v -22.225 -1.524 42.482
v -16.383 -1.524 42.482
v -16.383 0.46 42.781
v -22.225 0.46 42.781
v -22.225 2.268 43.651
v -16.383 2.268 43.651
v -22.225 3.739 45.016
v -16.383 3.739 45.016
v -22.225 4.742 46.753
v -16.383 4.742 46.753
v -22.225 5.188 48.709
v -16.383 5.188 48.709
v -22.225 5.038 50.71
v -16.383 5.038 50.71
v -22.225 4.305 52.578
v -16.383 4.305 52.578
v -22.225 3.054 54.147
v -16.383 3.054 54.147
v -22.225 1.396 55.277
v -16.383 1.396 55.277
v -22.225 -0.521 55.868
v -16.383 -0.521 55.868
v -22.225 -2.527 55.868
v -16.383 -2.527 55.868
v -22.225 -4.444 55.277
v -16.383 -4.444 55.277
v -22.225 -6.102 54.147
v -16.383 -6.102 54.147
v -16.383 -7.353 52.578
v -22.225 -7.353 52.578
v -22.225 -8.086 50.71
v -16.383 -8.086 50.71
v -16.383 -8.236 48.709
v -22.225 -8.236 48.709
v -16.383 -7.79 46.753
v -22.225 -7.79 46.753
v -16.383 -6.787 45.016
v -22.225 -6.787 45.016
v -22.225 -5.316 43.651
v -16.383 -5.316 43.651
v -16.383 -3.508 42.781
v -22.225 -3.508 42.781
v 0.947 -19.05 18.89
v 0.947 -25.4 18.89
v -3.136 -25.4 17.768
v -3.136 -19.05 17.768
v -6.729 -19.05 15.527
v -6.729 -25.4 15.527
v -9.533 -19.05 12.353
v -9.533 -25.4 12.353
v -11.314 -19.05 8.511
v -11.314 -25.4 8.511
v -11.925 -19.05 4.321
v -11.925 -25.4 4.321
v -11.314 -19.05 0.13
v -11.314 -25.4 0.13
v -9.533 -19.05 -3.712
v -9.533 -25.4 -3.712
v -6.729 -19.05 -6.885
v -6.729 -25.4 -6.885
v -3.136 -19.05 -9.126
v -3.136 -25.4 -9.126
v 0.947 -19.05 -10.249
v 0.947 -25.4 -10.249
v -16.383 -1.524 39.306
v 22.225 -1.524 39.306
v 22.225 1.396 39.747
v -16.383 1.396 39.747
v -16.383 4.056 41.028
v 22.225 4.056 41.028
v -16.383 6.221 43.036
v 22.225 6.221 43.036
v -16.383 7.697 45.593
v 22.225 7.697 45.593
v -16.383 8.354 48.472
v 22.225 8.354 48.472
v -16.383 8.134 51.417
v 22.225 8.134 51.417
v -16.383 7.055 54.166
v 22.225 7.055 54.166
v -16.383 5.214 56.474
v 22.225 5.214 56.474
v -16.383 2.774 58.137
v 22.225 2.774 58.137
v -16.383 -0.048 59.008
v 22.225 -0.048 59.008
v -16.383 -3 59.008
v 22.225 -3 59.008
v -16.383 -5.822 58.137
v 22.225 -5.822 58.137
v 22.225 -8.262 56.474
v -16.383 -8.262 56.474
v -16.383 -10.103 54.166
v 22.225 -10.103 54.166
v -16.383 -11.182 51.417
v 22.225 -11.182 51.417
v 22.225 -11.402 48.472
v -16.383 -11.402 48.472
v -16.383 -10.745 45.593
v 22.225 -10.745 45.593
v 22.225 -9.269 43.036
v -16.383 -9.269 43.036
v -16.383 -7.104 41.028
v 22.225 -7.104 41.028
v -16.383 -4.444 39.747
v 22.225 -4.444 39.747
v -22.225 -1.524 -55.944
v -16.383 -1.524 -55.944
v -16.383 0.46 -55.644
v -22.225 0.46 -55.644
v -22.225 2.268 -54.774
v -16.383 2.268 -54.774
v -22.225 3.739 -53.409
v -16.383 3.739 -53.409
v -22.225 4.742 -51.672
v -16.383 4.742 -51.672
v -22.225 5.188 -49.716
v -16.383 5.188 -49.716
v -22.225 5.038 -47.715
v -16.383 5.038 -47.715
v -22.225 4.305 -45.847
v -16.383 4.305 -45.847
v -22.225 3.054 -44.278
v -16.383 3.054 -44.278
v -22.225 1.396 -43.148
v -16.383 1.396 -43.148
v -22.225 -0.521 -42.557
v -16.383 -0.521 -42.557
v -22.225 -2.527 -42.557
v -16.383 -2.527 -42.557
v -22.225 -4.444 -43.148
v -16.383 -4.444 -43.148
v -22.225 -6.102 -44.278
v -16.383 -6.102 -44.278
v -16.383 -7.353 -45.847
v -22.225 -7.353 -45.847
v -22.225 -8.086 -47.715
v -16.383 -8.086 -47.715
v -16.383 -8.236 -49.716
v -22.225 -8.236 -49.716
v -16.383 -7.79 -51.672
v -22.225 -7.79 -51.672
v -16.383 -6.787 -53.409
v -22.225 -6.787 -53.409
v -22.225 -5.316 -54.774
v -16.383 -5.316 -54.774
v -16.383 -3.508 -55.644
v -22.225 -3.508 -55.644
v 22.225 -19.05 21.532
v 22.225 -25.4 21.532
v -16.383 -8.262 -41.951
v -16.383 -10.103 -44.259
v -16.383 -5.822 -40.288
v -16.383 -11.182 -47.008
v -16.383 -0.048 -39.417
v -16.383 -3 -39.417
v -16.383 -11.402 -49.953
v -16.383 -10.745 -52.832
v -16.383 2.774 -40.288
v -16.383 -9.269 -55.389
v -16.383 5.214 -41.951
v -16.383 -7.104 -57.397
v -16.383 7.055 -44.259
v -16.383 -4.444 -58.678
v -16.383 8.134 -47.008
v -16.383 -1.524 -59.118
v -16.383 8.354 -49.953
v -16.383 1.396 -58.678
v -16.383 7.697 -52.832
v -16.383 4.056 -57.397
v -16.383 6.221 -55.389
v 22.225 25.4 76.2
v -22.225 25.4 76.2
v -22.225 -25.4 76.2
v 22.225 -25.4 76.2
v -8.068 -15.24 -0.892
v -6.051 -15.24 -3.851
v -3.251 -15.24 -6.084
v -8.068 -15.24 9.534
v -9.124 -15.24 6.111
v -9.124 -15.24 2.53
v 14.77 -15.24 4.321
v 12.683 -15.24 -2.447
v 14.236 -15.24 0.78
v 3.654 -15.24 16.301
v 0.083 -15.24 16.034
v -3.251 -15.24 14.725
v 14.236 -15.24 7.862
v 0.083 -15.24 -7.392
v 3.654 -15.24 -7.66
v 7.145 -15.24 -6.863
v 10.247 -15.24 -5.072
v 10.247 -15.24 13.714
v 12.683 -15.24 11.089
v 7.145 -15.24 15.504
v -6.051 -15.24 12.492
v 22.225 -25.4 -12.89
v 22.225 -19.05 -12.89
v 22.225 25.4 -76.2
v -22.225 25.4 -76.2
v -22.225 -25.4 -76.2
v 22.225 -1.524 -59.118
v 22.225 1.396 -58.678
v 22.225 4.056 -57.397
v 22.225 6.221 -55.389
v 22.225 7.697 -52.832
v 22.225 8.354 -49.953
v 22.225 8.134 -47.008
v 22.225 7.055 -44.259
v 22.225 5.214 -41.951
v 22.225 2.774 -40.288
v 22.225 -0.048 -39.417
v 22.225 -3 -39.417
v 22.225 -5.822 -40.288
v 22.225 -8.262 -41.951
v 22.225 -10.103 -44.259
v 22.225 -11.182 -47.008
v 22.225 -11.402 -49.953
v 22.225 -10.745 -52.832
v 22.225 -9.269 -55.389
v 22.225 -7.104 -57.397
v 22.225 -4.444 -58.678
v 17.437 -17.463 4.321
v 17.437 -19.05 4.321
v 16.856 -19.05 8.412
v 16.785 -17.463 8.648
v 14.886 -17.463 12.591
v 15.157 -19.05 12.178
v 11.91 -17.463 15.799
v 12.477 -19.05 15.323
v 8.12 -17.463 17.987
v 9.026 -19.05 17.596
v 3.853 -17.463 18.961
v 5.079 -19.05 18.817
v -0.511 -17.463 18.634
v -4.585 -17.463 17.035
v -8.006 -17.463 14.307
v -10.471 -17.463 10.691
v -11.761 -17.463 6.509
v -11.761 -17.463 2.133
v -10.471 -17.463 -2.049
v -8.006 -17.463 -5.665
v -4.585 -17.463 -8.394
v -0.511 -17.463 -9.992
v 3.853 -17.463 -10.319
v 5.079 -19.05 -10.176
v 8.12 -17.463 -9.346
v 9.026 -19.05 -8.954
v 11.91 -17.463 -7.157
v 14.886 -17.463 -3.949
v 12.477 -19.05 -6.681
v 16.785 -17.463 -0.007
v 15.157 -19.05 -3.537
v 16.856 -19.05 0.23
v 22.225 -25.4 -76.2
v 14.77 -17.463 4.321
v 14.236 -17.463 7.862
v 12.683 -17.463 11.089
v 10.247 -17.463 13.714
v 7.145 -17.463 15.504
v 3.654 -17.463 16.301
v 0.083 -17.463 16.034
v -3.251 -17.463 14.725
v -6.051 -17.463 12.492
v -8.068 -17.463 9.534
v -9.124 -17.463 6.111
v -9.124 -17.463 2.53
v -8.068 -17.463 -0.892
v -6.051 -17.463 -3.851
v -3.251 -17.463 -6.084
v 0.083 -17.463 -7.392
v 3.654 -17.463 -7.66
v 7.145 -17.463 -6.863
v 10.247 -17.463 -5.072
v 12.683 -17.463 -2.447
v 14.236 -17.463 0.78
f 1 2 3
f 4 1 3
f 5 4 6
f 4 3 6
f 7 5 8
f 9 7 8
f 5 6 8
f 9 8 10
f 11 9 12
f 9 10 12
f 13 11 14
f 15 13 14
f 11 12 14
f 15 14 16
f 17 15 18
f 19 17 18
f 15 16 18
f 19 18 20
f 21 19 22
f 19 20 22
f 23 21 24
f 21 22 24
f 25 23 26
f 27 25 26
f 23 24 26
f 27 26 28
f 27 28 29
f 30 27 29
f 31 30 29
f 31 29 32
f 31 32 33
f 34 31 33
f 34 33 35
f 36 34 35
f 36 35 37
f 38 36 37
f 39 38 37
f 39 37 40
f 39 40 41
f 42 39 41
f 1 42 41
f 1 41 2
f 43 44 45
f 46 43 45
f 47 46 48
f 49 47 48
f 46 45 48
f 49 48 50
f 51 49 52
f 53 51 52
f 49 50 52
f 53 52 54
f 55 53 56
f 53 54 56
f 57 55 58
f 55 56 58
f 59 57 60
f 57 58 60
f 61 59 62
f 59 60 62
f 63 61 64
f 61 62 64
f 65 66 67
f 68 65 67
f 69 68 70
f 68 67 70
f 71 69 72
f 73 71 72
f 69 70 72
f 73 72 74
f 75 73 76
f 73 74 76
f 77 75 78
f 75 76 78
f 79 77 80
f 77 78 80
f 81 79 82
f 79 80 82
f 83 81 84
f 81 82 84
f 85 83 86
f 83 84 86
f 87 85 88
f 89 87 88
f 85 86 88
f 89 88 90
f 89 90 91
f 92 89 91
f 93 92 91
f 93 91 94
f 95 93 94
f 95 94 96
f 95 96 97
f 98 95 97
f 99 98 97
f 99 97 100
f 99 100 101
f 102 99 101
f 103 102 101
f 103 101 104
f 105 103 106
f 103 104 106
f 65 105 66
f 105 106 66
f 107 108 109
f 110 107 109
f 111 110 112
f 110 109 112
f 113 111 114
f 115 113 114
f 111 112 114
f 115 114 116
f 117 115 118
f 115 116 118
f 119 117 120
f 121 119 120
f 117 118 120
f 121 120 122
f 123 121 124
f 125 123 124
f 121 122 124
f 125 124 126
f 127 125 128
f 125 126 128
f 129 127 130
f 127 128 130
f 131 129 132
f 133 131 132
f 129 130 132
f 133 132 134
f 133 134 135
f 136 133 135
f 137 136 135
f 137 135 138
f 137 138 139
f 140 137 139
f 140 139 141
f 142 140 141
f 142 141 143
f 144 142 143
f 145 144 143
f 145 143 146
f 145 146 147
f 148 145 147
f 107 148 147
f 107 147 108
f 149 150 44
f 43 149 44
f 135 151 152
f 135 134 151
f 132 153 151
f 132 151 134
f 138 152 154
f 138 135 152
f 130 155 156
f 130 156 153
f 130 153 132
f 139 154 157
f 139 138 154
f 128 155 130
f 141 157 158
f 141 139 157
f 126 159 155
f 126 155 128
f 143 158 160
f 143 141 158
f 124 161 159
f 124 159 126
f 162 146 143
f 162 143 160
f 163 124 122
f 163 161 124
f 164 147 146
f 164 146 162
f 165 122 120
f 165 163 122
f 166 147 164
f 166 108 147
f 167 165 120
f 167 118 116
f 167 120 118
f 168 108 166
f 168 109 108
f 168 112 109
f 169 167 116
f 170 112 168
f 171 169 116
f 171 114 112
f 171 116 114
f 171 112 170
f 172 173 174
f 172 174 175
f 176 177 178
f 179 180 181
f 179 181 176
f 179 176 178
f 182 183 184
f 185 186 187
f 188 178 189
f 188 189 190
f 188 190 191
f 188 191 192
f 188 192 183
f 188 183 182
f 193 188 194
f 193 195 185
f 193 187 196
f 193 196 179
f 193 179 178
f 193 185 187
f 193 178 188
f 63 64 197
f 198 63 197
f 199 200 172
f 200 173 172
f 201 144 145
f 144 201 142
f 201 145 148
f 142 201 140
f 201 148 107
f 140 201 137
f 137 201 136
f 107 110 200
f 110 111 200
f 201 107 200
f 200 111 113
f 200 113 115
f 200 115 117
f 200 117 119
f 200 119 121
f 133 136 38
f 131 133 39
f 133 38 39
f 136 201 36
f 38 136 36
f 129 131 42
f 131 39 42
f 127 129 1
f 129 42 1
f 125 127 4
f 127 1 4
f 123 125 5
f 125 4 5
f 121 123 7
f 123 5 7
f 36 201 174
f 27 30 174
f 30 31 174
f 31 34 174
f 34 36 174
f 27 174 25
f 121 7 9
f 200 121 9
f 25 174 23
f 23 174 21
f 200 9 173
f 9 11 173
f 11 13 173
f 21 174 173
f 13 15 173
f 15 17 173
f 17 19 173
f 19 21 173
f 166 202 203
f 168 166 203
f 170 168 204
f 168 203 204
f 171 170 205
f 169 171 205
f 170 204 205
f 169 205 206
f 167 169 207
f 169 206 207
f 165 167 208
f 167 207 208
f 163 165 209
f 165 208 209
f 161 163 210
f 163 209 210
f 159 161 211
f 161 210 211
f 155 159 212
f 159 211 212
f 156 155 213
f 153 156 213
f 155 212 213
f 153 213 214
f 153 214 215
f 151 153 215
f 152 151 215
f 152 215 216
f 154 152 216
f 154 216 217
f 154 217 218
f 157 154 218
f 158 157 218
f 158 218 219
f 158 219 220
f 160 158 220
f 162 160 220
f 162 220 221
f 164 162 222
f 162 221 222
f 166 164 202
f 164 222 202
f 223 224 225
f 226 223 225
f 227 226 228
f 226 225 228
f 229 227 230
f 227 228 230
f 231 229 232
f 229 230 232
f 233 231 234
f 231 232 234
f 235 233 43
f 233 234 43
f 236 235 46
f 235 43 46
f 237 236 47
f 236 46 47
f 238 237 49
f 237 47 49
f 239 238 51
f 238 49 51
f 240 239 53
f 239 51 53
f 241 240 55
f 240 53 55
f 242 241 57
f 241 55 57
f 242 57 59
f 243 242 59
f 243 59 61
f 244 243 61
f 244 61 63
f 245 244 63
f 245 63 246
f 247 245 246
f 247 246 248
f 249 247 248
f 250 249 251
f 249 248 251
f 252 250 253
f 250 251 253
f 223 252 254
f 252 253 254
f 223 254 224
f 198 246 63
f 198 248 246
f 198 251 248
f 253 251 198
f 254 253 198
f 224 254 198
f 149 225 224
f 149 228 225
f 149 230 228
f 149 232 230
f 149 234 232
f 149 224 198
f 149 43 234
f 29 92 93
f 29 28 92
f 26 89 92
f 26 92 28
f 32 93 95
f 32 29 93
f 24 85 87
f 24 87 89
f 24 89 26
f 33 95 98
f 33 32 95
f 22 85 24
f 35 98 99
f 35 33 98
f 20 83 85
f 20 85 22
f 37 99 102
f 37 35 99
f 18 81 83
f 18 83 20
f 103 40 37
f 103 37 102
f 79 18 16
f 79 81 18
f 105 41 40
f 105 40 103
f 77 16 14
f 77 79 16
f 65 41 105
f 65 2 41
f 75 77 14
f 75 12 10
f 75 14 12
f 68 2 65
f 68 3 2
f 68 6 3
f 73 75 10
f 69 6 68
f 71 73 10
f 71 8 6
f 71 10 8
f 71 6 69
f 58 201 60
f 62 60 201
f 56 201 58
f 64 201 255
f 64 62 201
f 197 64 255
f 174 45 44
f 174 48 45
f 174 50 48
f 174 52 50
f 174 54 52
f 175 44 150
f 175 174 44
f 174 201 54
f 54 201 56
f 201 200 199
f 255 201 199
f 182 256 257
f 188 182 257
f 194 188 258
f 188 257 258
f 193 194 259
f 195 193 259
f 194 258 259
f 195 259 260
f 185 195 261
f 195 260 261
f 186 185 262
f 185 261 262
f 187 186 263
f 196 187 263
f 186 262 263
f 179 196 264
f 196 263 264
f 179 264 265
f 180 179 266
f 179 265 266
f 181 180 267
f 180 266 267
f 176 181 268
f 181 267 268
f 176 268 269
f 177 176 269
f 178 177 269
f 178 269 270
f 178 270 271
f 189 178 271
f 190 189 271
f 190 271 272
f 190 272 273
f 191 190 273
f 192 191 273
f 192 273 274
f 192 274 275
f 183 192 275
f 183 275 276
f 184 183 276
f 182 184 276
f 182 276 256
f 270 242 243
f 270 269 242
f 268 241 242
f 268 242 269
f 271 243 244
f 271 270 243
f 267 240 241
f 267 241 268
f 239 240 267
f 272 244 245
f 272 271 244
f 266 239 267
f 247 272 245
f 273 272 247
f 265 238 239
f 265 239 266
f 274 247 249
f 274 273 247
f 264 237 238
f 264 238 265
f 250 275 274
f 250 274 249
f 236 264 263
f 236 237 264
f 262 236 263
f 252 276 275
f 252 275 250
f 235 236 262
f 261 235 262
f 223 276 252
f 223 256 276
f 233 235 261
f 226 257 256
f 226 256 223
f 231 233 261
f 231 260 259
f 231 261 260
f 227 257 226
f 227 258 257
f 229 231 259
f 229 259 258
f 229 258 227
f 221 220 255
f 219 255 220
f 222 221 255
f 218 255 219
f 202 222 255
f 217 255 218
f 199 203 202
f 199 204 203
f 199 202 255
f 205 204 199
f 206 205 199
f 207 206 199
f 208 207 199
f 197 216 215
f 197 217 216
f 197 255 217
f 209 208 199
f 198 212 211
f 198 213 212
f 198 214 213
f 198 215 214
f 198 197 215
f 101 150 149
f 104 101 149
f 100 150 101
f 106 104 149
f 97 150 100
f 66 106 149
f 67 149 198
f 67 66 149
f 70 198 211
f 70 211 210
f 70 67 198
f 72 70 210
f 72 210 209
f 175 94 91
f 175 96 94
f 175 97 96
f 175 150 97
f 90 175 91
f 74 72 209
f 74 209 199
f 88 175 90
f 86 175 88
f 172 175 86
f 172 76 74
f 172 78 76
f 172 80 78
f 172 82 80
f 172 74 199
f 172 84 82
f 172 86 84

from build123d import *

# Parameters (mm, degrees)
SKETCH1_W           = 44.45
SKETCH1_H           = 50.8
BOSS_EXTRUDE1_DEPTH = 76.2
CUT_EXTRUDE1_REACH  = 93.801
SKETCH2_R           = 6.731
SKETCH3_R           = 9.906
CUT_EXTRUDE2_DEPTH  = 38.608
CUT_EXTRUDE3_DEPTH  = 6.35
SKETCH5_R           = 12.0142
CUT_EXTRUDE4_DEPTH  = 3.81
SKETCH6_R           = 14.6812
CUT_EXTRUDE5_DEPTH  = 1.5875


with BuildPart() as part:
    # Sketch1 → Boss-Extrude1 (new, symmetric)
    with BuildSketch(Plane.XY):
        Rectangle(SKETCH1_W, SKETCH1_H)
    extrude(amount=BOSS_EXTRUDE1_DEPTH, both=True)

    # Sketch2 → Cut-Extrude1 (cut, up to next)
    with BuildSketch(Plane(origin=(22.225, 0, 0), x_dir=(0, 0, -1), z_dir=(1, 0, 0)), mode=Mode.PRIVATE) as cut_extrude1_sk1:
        with Locations((-49.2125, -1.524)):
            Circle(SKETCH2_R)
    cut_extrude1_tool1 = extrude(cut_extrude1_sk1.sketch, amount=-CUT_EXTRUDE1_REACH, mode=Mode.PRIVATE) & part.part
    # Sketch2 → Cut-Extrude1 (cut, up to next)
    with BuildSketch(Plane(origin=(22.225, 0, 0), x_dir=(0, 0, -1), z_dir=(1, 0, 0)), mode=Mode.PRIVATE) as cut_extrude1_sk2:
        with Locations((49.2125, -1.524)):
            Circle(SKETCH2_R)
    cut_extrude1_tool2 = extrude(cut_extrude1_sk2.sketch, amount=-CUT_EXTRUDE1_REACH, mode=Mode.PRIVATE) & part.part
    add(cut_extrude1_tool1.solids().sort_by_distance((22.225, -1.524, 49.2125))[0], mode=Mode.SUBTRACT)
    add(cut_extrude1_tool2.solids().sort_by_distance((22.225, -1.524, -49.2125))[0], mode=Mode.SUBTRACT)

    # Sketch3 → Cut-Extrude2 (cut)
    with BuildSketch(Plane(origin=(22.225, 0, 0), x_dir=(0, 0, -1), z_dir=(1, 0, 0))):
        with Locations((-49.2125, -1.524)):
            Circle(SKETCH3_R)
        with Locations((49.2125, -1.524)):
            Circle(SKETCH3_R)
    extrude(amount=-CUT_EXTRUDE2_DEPTH, mode=Mode.SUBTRACT)

    # Sketch4 → Cut-Extrude3 (cut)
    with BuildSketch(Plane.XZ.offset(25.4)):
        with BuildLine():
            Line((22.225, -12.890241244), (22.225, 21.531765175))
            Line((22.225, 21.531765175), (0.947246364, 18.89010908))
            ThreePointArc((0.947246364, 18.89010908), (-11.925153457, 4.320761965), (0.947246364, -10.248585149))
            Line((0.947246364, -10.248585149), (22.225, -12.890241244))
        make_face()
    extrude(amount=-CUT_EXTRUDE3_DEPTH, mode=Mode.SUBTRACT)

    # Sketch5 → Cut-Extrude4 (cut)
    with BuildSketch(Plane.XZ.offset(19.05)):
        with Locations((2.756046543, 4.320761965)):
            Circle(SKETCH5_R)
    extrude(amount=-CUT_EXTRUDE4_DEPTH, mode=Mode.SUBTRACT)

    # Sketch6 → Cut-Extrude5 (cut)
    with BuildSketch(Plane.XZ.offset(19.05)):
        with Locations((2.756046543, 4.320761965)):
            Circle(SKETCH6_R)
    extrude(amount=-CUT_EXTRUDE5_DEPTH, mode=Mode.SUBTRACT)


solid = part.part
